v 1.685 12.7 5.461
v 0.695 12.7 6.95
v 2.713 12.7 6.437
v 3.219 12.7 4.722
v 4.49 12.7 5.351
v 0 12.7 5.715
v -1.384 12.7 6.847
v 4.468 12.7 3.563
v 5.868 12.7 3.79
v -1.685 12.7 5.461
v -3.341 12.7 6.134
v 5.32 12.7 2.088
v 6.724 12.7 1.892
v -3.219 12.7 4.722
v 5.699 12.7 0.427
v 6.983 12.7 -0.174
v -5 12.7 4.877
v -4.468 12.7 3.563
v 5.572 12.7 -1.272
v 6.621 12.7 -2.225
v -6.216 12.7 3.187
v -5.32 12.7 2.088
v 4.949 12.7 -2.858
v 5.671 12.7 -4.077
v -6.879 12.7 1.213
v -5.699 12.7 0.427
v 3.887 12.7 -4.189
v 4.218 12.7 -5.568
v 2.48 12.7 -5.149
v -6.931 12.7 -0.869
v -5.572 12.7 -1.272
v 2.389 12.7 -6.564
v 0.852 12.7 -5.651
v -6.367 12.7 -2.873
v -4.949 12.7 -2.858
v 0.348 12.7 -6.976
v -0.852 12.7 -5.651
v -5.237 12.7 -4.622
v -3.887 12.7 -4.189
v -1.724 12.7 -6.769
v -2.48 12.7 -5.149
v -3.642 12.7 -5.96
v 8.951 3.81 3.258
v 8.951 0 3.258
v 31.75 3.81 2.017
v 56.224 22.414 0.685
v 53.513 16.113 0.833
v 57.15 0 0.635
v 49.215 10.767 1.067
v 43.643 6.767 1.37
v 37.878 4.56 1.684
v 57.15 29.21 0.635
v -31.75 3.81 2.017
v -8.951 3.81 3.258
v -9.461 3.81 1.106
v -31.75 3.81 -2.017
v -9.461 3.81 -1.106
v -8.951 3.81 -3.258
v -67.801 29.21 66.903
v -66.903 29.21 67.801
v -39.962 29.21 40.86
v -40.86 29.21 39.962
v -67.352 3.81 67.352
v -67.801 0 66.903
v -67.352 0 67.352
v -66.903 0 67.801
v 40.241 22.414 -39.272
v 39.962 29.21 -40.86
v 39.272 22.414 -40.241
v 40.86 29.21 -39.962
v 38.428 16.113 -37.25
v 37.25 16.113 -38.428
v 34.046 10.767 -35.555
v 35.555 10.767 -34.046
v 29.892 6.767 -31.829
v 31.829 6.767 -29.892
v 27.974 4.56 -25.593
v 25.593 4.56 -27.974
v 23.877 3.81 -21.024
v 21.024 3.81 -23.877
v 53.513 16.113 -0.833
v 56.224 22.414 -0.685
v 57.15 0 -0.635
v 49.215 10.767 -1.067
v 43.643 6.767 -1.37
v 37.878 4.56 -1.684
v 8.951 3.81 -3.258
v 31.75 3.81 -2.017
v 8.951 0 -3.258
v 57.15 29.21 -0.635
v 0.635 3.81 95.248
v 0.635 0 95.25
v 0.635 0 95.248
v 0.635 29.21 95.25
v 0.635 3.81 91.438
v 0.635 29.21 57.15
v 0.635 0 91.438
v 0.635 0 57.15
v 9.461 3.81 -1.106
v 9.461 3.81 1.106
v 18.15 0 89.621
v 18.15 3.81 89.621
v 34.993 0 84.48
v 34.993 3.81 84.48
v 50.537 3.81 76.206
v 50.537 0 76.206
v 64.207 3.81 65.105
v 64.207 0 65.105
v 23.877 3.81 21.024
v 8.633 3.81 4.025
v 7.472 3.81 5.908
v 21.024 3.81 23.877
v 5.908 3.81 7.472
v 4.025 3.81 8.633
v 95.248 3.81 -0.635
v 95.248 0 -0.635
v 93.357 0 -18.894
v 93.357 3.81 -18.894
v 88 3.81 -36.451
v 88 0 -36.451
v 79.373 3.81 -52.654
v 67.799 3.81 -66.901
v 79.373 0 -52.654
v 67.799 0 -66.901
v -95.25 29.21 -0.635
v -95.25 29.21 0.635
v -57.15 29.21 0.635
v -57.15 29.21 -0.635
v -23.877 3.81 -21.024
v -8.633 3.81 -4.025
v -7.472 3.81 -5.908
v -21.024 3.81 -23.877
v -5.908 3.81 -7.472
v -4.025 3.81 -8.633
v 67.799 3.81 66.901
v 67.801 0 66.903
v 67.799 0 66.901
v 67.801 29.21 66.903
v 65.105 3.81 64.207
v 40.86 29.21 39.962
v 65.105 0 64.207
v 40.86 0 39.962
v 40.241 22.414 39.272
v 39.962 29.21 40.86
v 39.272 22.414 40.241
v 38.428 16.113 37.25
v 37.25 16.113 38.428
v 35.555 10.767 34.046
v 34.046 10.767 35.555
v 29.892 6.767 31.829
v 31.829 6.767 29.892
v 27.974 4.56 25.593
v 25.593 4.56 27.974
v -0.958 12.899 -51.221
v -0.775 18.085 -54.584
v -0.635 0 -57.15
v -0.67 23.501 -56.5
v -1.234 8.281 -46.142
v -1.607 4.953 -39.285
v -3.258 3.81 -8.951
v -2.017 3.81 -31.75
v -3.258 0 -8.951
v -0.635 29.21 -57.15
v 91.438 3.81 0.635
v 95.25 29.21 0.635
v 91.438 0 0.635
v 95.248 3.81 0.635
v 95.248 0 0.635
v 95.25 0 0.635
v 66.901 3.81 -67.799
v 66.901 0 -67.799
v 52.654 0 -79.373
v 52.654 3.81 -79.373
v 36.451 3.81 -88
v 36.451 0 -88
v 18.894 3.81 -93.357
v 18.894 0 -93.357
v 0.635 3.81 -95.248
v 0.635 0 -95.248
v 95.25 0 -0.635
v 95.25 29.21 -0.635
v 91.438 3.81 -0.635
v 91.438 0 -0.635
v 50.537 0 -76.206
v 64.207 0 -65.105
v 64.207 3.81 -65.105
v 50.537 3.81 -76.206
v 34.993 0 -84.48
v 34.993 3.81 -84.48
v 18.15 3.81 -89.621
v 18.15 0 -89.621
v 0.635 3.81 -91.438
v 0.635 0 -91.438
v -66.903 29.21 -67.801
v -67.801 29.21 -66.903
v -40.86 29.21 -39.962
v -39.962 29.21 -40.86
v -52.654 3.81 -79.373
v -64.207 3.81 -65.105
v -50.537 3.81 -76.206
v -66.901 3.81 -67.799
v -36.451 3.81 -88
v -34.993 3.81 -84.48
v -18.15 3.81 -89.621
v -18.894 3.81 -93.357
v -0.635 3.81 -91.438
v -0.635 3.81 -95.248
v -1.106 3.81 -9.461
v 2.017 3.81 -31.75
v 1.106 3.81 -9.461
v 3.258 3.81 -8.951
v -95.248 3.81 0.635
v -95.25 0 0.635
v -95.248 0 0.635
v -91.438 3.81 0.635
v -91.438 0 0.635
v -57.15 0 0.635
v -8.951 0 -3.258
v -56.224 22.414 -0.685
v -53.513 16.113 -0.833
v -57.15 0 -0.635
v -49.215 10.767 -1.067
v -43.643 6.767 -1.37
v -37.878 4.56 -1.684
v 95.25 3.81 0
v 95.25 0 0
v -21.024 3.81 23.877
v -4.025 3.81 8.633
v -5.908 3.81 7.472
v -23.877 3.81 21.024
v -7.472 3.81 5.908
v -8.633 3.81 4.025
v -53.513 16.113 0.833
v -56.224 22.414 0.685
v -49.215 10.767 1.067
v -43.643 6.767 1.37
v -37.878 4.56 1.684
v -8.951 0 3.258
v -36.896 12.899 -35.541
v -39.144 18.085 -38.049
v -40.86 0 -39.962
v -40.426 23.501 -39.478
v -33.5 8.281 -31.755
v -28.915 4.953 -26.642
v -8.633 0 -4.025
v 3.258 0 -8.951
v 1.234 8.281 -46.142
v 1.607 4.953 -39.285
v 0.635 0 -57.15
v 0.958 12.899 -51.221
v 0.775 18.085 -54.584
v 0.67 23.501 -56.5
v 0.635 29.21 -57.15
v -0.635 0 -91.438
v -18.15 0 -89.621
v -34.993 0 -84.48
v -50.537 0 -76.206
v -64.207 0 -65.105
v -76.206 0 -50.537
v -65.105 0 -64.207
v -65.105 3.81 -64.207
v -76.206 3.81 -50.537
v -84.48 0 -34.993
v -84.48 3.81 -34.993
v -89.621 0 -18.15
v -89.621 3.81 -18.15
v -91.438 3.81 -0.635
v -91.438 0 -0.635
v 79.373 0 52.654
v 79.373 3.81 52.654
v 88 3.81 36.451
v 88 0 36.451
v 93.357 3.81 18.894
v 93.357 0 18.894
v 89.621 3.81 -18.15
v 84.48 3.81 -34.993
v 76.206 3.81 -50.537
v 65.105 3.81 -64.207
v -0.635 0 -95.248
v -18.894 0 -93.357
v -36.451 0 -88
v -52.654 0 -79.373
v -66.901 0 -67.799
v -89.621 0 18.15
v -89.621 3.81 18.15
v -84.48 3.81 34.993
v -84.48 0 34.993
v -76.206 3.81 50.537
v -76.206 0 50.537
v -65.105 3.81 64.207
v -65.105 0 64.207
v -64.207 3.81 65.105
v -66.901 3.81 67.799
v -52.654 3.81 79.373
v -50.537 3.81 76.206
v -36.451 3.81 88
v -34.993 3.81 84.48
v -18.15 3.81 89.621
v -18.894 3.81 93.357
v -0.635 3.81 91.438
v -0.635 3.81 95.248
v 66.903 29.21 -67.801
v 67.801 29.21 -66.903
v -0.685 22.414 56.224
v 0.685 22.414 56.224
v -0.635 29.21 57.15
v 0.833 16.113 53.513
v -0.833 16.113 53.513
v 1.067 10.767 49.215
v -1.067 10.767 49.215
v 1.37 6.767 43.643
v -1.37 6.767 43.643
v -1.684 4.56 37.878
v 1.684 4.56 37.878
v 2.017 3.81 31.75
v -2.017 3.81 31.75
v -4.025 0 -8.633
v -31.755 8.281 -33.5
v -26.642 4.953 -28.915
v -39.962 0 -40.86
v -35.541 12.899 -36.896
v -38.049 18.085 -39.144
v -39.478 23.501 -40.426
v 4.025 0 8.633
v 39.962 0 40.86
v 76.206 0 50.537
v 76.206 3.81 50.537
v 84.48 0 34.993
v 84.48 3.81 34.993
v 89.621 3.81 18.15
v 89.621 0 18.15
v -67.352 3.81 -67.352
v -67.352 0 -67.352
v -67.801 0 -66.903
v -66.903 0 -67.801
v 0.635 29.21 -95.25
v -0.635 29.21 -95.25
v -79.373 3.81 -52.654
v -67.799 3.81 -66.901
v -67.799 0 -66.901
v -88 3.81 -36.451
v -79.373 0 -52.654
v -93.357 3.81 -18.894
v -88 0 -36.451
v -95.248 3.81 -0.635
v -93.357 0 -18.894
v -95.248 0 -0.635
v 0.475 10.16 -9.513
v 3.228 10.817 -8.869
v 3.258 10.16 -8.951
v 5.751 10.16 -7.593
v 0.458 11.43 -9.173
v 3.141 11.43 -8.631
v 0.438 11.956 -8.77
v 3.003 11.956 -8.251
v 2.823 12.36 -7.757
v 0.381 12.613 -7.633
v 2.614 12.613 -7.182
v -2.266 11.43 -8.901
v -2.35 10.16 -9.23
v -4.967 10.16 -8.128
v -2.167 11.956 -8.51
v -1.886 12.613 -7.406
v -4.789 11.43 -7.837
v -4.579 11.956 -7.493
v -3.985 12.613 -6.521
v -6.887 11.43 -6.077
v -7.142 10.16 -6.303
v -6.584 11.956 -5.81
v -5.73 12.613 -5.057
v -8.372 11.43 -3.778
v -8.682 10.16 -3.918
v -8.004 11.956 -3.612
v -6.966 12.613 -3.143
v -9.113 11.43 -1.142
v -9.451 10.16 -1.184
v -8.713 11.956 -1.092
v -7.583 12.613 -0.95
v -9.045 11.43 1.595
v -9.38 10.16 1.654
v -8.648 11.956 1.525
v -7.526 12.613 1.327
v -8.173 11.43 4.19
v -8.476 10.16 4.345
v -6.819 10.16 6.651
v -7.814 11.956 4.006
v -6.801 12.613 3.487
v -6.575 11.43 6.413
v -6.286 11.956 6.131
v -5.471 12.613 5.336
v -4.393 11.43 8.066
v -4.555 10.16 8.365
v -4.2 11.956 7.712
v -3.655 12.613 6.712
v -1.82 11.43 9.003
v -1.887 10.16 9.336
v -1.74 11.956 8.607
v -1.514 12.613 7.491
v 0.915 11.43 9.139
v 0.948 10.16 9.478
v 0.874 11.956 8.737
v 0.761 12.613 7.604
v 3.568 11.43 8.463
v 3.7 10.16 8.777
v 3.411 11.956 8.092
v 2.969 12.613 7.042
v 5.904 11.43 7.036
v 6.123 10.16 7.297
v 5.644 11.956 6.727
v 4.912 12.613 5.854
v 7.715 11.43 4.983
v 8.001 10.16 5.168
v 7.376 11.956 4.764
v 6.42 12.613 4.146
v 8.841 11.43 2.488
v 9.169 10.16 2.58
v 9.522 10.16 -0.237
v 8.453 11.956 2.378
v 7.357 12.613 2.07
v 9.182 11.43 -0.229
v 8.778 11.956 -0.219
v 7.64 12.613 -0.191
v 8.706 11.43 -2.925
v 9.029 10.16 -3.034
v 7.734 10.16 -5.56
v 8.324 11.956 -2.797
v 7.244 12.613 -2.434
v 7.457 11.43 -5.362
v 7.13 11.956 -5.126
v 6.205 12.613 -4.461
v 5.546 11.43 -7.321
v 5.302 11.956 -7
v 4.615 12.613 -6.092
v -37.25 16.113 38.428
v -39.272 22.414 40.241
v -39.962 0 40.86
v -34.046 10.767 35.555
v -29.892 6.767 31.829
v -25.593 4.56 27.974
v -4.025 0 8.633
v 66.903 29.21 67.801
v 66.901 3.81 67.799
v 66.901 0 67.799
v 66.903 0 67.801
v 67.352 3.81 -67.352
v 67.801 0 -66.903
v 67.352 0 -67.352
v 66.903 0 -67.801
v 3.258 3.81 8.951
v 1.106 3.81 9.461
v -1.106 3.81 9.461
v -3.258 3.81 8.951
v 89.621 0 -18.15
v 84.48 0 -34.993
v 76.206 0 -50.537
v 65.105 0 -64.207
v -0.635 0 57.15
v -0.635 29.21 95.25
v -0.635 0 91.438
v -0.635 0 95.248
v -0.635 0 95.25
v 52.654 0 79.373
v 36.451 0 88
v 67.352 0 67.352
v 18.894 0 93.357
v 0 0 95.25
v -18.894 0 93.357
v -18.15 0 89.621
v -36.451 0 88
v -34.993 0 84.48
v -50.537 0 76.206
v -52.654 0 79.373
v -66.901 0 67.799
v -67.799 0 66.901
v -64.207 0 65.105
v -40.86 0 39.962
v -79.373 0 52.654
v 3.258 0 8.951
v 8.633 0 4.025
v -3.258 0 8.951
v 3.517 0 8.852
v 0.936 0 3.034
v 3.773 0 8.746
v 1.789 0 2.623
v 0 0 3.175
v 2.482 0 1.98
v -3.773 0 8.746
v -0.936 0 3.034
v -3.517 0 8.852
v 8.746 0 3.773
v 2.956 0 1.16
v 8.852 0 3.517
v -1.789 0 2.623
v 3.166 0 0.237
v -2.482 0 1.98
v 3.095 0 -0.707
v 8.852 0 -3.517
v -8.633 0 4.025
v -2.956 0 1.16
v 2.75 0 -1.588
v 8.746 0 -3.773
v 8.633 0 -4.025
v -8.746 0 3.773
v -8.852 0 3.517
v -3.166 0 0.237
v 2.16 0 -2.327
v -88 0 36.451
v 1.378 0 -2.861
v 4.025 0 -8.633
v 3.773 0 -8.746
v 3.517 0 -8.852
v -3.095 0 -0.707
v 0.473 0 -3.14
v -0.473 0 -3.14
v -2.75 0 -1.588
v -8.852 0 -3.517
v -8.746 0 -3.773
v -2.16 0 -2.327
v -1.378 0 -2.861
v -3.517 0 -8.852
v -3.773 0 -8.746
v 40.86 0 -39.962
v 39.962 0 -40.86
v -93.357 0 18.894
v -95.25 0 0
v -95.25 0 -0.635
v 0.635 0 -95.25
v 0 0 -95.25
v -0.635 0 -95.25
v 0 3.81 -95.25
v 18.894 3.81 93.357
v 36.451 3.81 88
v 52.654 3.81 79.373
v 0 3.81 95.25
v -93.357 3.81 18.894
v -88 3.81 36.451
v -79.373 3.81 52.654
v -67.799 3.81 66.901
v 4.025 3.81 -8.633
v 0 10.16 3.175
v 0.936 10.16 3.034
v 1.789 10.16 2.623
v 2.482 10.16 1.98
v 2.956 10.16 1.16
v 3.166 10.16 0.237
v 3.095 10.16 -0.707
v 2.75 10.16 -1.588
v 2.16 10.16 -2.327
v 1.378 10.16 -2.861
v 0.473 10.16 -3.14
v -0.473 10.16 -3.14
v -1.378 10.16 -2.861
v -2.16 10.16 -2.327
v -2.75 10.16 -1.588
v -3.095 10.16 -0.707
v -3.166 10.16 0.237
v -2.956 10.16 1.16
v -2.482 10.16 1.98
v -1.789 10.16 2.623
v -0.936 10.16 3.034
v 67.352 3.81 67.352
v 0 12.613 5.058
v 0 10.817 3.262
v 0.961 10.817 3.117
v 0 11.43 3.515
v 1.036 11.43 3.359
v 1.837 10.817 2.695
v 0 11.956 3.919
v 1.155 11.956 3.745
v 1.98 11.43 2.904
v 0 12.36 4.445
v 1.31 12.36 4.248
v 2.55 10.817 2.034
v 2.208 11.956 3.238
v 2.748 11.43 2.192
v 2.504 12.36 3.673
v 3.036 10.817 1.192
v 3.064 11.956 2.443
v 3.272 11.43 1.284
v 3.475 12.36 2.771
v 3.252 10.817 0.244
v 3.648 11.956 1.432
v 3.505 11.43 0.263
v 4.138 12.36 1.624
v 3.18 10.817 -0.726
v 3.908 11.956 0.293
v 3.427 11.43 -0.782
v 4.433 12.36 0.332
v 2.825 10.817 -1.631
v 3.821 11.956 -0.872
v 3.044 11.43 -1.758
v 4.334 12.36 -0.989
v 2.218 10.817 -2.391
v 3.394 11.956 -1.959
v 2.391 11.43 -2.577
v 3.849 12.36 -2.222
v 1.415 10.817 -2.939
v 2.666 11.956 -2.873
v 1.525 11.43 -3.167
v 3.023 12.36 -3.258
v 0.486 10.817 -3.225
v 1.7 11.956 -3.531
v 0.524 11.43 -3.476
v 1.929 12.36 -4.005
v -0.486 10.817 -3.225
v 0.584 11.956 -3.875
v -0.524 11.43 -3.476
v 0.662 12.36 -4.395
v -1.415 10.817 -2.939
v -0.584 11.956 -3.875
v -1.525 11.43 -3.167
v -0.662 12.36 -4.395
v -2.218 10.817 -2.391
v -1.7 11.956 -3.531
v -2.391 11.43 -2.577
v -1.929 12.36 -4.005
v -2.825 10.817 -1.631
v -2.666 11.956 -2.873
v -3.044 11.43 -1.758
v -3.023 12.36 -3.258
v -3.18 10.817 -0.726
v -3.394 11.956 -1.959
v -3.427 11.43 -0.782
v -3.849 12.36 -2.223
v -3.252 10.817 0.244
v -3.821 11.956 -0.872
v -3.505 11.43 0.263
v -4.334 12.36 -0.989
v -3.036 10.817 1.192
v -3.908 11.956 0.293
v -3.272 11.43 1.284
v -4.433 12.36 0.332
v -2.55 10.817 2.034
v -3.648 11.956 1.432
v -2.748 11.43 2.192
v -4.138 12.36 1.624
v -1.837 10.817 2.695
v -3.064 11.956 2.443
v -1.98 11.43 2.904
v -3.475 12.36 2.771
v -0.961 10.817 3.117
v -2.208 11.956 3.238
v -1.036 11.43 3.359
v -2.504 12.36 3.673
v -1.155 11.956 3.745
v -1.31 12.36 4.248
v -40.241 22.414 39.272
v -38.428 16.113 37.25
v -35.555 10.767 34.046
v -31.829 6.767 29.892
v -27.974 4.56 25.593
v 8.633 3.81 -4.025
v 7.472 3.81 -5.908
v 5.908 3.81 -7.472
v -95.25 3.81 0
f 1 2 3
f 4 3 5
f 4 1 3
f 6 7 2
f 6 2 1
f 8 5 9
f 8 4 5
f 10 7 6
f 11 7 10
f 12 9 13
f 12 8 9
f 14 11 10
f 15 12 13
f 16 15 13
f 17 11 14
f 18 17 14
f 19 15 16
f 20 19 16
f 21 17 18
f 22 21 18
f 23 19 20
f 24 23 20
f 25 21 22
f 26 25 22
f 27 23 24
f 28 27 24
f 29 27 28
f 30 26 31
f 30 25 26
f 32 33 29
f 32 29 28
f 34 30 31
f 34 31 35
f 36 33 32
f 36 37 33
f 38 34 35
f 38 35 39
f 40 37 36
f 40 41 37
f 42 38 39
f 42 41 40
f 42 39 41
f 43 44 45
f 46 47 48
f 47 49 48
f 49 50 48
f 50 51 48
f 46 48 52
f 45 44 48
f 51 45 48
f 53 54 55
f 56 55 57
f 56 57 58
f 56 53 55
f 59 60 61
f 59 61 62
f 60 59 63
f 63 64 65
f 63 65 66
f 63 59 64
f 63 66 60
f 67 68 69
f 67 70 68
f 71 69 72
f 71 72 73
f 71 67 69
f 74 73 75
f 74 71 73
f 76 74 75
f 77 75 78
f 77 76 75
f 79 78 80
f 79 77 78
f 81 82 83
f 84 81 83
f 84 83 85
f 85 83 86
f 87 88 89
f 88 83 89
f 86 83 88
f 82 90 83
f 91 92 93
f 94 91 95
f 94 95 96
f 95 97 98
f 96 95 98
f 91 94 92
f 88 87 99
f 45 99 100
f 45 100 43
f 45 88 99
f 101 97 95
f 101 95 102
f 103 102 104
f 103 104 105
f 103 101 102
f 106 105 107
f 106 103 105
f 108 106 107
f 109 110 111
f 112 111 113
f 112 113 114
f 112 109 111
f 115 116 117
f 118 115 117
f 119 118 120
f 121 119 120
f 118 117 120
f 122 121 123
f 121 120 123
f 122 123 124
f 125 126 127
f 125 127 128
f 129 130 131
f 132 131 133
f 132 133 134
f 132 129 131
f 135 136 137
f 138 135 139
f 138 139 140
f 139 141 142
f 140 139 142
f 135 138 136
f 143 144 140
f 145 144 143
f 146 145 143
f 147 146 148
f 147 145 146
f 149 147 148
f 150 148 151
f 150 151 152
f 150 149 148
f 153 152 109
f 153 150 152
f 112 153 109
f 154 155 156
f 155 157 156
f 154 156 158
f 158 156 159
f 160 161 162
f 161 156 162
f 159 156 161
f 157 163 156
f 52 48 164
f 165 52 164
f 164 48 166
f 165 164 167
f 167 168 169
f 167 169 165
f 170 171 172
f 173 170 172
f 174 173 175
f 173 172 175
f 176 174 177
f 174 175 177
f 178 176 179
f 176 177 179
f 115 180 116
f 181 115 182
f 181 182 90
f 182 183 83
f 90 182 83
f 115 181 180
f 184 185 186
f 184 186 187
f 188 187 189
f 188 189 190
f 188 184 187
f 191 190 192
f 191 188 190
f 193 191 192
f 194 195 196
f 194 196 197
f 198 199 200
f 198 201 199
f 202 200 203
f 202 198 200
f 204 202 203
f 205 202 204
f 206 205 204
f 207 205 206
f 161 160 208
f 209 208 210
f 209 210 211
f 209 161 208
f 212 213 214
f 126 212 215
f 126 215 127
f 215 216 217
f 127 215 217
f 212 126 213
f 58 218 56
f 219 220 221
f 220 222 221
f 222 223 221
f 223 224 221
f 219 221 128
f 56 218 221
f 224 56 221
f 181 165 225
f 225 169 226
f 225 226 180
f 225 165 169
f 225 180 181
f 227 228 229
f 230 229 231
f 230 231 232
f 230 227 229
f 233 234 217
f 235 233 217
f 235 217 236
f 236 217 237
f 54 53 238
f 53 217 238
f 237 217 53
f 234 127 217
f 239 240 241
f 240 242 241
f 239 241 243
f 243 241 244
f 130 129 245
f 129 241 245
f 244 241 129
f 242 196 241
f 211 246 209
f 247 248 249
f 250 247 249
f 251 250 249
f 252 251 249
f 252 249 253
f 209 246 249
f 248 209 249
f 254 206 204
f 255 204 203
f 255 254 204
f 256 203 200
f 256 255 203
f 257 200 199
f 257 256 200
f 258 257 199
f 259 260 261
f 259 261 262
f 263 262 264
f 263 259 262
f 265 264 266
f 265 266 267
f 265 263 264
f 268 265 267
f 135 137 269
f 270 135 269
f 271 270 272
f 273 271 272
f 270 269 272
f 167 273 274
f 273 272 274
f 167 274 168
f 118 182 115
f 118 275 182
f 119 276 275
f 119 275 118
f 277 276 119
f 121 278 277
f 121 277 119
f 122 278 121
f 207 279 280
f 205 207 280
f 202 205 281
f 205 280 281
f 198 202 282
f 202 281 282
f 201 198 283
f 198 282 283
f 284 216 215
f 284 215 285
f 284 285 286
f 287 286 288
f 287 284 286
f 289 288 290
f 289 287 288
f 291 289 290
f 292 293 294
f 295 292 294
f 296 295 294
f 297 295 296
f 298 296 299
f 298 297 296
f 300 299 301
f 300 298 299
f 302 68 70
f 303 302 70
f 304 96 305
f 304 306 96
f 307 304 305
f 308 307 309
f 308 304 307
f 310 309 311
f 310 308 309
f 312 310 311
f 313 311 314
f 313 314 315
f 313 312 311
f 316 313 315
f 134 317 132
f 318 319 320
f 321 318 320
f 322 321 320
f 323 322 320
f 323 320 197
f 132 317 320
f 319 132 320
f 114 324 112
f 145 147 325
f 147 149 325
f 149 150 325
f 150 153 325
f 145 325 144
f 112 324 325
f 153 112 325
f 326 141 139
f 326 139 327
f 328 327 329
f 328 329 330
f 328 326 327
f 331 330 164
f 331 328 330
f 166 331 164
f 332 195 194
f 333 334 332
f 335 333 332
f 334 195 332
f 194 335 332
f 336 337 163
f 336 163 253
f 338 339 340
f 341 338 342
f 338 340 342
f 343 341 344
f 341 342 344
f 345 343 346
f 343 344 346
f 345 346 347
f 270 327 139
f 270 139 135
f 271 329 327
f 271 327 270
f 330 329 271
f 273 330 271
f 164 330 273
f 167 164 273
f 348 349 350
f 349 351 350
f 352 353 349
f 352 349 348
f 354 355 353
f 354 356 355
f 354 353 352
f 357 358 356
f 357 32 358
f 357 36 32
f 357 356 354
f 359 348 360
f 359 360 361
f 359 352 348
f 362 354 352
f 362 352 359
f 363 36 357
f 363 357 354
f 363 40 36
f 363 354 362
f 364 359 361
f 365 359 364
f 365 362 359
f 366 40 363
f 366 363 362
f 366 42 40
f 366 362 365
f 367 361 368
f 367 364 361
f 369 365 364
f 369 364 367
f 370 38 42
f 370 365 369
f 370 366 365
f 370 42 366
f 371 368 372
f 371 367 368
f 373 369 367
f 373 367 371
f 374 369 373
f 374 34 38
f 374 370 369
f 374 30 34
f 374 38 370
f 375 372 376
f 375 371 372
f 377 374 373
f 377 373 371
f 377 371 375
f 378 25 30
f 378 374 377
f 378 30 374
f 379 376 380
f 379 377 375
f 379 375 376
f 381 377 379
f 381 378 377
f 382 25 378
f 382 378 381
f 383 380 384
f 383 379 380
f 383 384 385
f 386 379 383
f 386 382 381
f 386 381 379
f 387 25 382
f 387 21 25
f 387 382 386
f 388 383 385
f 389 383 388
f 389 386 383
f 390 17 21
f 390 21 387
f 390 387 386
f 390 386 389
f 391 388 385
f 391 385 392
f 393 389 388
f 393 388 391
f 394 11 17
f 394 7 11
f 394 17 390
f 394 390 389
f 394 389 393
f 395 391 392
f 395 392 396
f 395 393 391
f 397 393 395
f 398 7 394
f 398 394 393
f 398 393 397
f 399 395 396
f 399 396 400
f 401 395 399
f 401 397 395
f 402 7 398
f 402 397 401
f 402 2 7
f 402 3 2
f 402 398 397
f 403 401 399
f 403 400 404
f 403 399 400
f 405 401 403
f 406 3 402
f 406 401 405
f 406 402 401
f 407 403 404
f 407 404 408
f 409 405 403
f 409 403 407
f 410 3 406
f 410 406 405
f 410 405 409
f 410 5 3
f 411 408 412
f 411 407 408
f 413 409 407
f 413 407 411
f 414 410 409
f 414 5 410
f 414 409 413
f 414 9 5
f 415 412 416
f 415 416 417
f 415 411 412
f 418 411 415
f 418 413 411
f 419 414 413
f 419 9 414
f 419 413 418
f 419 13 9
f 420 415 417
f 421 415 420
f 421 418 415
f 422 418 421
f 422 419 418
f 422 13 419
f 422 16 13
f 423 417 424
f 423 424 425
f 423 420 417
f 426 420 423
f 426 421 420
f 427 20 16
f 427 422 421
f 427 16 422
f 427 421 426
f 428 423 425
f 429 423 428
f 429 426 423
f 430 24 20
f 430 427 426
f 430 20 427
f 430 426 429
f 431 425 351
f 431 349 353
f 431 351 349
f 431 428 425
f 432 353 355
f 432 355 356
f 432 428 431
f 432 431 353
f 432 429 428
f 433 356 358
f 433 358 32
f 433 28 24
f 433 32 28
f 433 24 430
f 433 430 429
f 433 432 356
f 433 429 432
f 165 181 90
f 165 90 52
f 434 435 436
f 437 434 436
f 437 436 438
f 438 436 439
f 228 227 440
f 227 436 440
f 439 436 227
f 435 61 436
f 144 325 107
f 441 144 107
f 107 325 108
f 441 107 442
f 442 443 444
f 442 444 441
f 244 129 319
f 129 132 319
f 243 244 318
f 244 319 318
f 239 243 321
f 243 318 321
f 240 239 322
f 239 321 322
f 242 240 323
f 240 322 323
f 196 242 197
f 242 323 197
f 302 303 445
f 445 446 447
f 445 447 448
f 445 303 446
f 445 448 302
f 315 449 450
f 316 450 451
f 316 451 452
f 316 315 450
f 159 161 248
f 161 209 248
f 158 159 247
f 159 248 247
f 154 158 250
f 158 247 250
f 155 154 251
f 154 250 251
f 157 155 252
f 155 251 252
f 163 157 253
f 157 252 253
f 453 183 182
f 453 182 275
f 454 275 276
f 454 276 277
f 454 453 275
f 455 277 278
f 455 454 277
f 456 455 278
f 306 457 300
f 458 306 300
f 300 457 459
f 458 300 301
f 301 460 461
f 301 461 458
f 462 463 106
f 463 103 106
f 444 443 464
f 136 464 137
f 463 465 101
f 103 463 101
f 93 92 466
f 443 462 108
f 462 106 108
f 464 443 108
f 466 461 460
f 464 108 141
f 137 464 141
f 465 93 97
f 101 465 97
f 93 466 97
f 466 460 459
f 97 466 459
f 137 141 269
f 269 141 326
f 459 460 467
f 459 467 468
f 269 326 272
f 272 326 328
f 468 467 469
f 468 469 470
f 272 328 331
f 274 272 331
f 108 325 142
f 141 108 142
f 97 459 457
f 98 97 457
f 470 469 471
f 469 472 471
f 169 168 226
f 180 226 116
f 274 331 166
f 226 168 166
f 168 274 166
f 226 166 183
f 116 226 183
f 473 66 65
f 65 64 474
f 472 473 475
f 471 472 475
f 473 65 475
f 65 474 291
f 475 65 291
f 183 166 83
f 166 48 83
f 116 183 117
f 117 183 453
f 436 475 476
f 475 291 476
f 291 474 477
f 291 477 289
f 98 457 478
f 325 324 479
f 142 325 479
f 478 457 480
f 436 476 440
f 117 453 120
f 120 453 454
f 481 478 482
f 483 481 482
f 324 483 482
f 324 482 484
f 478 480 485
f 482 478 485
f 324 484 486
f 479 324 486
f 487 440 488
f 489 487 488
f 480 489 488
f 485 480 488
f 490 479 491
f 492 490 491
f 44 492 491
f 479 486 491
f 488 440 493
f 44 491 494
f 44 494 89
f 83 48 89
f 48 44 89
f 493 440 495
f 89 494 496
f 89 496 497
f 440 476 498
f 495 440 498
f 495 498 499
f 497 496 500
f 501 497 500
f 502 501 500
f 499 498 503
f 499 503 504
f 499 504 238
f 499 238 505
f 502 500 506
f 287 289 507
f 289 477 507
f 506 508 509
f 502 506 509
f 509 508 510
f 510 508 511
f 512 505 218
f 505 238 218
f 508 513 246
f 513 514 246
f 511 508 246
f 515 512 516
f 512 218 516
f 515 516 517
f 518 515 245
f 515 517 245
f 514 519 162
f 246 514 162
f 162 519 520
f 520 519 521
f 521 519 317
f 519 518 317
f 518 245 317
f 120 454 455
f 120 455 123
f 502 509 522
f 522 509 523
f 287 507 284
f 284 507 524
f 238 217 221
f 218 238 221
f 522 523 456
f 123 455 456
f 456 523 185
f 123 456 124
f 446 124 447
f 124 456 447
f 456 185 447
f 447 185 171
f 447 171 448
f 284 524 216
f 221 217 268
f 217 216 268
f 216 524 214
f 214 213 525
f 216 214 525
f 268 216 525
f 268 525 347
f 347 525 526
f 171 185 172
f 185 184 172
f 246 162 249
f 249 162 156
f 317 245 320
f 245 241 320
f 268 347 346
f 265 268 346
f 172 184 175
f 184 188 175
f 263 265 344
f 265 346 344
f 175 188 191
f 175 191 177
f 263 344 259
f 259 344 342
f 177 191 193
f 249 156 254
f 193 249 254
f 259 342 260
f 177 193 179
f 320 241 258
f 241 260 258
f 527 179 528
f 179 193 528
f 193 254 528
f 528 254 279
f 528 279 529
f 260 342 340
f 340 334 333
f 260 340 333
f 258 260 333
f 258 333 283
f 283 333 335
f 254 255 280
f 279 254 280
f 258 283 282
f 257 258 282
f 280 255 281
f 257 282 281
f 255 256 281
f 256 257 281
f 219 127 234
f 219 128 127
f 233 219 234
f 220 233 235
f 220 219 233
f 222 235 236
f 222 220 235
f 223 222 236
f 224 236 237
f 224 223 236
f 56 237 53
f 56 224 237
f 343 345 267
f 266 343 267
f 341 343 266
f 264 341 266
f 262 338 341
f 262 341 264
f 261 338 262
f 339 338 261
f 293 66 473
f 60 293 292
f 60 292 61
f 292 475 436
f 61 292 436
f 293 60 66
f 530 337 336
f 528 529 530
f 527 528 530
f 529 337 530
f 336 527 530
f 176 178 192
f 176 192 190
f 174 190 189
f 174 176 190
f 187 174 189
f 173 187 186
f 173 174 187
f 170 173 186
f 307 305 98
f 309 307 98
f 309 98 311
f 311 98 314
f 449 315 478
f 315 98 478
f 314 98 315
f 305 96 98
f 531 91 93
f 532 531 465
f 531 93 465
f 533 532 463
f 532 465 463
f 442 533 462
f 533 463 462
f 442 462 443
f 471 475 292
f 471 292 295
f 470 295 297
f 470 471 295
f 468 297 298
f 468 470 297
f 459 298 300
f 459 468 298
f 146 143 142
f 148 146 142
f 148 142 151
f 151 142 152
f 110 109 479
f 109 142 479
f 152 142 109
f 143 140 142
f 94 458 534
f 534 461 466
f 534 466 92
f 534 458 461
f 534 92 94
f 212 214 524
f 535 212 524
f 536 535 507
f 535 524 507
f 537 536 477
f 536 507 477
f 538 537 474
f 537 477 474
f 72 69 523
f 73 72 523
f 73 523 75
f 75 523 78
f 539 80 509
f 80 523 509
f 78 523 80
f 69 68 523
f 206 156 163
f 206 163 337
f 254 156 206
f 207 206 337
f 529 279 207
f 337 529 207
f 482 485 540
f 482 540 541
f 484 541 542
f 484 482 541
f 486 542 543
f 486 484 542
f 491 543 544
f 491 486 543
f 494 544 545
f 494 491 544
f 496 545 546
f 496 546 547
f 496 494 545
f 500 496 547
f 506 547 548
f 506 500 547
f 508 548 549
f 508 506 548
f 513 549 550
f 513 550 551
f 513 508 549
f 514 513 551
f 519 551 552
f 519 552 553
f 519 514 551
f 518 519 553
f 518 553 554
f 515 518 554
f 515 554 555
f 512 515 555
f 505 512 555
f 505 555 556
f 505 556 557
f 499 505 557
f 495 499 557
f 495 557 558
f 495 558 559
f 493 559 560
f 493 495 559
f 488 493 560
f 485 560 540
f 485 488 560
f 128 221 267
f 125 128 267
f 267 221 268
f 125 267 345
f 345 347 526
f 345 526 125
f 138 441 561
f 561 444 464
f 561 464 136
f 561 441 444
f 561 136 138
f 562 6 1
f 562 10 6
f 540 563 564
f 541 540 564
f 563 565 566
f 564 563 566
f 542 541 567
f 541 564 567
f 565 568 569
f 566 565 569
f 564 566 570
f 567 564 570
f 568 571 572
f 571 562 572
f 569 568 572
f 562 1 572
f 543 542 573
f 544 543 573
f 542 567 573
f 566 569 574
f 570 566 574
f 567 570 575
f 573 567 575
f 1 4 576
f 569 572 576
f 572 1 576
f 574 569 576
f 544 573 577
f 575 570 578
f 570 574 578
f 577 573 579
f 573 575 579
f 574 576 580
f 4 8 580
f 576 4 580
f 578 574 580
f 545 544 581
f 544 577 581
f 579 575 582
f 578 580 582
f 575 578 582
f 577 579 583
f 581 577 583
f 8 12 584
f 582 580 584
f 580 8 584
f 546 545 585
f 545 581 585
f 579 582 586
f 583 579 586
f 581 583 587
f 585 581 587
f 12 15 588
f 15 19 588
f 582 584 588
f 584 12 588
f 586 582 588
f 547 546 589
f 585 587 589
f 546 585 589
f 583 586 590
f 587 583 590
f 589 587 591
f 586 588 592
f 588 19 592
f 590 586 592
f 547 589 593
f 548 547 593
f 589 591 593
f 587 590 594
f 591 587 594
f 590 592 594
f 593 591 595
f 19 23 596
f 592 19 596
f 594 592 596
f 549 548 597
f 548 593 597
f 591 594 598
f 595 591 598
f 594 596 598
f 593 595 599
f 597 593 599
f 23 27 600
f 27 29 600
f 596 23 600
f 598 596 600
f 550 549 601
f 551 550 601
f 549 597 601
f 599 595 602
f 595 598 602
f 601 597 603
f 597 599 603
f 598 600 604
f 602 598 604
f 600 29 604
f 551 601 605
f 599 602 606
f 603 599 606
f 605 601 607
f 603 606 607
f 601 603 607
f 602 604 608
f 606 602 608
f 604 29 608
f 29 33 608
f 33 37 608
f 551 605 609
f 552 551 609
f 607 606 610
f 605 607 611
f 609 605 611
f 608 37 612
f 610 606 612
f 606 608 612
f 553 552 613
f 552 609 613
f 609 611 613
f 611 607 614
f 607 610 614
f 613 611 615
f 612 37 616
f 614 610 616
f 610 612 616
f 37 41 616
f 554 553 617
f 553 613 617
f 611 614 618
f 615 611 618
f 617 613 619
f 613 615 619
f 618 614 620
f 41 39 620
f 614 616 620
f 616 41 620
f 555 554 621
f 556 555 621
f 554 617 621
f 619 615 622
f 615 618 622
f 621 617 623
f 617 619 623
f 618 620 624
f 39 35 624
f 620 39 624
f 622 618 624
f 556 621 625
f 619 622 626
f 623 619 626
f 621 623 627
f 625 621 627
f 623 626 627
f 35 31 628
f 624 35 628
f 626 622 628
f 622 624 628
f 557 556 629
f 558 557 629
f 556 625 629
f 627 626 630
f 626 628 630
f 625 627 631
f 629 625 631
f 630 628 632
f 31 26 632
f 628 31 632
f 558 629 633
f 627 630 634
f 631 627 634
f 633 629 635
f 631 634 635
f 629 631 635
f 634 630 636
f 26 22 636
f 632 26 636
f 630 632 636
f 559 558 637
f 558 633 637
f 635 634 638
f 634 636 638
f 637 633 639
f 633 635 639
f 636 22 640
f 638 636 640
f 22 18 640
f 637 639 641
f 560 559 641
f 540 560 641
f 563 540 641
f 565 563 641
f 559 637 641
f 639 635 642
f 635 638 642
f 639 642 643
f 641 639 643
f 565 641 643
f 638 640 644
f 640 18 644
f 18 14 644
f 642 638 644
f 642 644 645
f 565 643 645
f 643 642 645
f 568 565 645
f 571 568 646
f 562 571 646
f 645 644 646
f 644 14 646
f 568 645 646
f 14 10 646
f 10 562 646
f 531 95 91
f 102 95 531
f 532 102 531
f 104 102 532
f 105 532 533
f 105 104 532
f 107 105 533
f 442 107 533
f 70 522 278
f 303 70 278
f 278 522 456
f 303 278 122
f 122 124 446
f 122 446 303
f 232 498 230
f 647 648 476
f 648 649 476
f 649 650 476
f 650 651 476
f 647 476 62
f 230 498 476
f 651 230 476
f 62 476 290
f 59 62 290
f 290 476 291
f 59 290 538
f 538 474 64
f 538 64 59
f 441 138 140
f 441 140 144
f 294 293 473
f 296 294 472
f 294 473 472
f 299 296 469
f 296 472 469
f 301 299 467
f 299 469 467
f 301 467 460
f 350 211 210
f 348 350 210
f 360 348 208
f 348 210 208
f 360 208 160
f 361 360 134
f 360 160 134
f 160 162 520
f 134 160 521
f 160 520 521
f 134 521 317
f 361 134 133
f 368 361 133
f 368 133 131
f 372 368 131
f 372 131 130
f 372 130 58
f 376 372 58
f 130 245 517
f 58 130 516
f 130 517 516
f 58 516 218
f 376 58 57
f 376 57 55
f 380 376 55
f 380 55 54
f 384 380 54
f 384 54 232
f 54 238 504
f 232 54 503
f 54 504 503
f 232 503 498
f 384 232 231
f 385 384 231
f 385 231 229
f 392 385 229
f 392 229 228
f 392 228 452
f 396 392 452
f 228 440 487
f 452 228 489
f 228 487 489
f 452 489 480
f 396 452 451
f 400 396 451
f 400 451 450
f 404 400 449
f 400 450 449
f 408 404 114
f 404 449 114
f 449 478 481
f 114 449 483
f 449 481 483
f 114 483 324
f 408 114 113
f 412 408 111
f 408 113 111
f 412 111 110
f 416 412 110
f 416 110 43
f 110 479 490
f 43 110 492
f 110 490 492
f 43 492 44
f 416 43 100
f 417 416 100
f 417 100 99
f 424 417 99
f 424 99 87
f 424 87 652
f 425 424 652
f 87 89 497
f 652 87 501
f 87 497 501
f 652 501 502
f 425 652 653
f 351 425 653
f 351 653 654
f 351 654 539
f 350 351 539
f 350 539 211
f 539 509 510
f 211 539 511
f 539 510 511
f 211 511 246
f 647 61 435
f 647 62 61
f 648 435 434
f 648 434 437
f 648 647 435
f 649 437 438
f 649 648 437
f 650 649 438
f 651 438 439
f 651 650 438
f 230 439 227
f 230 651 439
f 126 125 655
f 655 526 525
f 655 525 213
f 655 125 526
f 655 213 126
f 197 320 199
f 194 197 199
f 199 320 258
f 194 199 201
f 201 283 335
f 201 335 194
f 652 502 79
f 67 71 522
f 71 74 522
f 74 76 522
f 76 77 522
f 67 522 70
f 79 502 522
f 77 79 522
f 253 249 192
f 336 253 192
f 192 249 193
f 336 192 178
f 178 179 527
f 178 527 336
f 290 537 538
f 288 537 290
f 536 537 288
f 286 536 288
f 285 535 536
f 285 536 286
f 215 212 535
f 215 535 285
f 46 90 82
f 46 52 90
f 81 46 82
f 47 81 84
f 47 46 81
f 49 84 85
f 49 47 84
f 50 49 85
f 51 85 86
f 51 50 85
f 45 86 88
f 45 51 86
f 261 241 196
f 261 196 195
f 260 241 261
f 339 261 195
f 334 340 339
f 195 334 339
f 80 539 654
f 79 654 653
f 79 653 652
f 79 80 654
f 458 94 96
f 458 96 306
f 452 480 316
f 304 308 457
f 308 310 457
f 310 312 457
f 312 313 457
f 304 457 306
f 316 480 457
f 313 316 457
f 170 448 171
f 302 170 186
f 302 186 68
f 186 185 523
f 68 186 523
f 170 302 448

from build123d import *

# Parameters (mm, degrees)
BOSS_EXTRUDE1_DEPTH      = 3.81
SKETCH2_W                = 1.27
SKETCH2_H                = 38.1
BOSS_EXTRUDE2_DEPTH      = 25.4
FILLET1_R                = 25.4
SKETCH4_R                = 9.525
SKETCH4_R_2              = 3.175
BOSS_EXTRUDE3_DEPTH      = 12.7
CIRPATTERN5_COUNT        = 8
FILLET1_OF_CIRPATTERN5_R = 25.4
SKETCH5_R                = 95.25
SKETCH5_R_2              = 91.44
BOSS_EXTRUDE4_DEPTH      = 3.81
FILLET2_R                = 2.54


with BuildPart() as part:
    # Sketch1 → Boss-Extrude1 (new body)
    with BuildSketch(Plane(origin=(0, 0, 0), x_dir=(1, 0, 0), z_dir=(0, 1, 0))):
        with BuildLine():
            Line((-0.635, 57.15), (-3.257741865, 8.950572213))
            ThreePointArc((-3.257741865, 8.950572213), (0, 9.525), (3.257741865, 8.950572213))
            Line((3.257741865, 8.950572213), (0.635, 57.15))
            Line((0.635, 57.15), (0.635, 95.25))
            Line((0.635, 95.25), (-0.635, 95.25))
            Line((-0.635, 95.25), (-0.635, 57.15))
        make_face()
    boss_extrude1 = extrude(amount=BOSS_EXTRUDE1_DEPTH)

    # Sketch2 → Boss-Extrude2 (add)
    with BuildSketch(Plane(origin=(0, 3.81, 0), x_dir=(1, 0, 0), z_dir=(0, 1, 0))):
        with Locations((0, 76.2)):
            Rectangle(SKETCH2_W, SKETCH2_H)
    boss_extrude2 = extrude(amount=BOSS_EXTRUDE2_DEPTH)

    # Fillet1
    fillet1_edges = [part.edges().sort_by_distance(p)[0] for p in [
        (0, 3.81, -57.15),
    ]]
    fillet(fillet1_edges, radius=FILLET1_R - 0.0001)  # a hair under: the kernel refuses the full size

    # Sketch4 → Boss-Extrude3 (add)
    with BuildSketch(Plane(origin=(0, 0, 0), x_dir=(1, 0, 0), z_dir=(0, 1, 0))):
        with Locations(Location((0, 0, 0), (0, 0, 70))):
            Circle(SKETCH4_R)
        with Locations(Location((0, 0, 0), (0, 0, 270))):
            Circle(SKETCH4_R_2, mode=Mode.SUBTRACT)
    extrude(amount=BOSS_EXTRUDE3_DEPTH)

    # CirPattern5: Boss-Extrude1, Boss-Extrude2 ×8 about axis
    cirpattern5_axis = Axis((0, 0, 0), (0, 1, 0))
    add([boss_extrude1.rotate(cirpattern5_axis, i * 360 / CIRPATTERN5_COUNT) for i in range(1, CIRPATTERN5_COUNT)])
    add([boss_extrude2.rotate(cirpattern5_axis, i * 360 / CIRPATTERN5_COUNT) for i in range(1, CIRPATTERN5_COUNT)])

    # Fillet1 of CirPattern5
    fillet1_of_cirpattern5_edges = [part.edges().sort_by_distance(p)[0] for p in [
        (-40.411152545, 3.81, -40.411152545),
        (-57.15, 3.81, 0),
        (-40.411152545, 3.81, 40.411152545),
        (0, 3.81, 57.15),
        (40.411152545, 3.81, 40.411152545),
        (57.15, 3.81, 0),
        (40.411152545, 3.81, -40.411152545),
    ]]
    fillet(fillet1_of_cirpattern5_edges, radius=FILLET1_OF_CIRPATTERN5_R - 0.0001)  # a hair under: the kernel refuses the full size

    # Sketch5 → Boss-Extrude4 (add)
    with BuildSketch(Plane(origin=(0, 0, 0), x_dir=(1, 0, 0), z_dir=(0, 1, 0))):
        Circle(SKETCH5_R)
        Circle(SKETCH5_R_2, mode=Mode.SUBTRACT)
    extrude(amount=BOSS_EXTRUDE4_DEPTH)

    # Fillet2
    fillet2_edges = [part.edges().sort_by_distance(p)[0] for p in [
        (-3.257741865, 12.7, 8.950572213),
        (0, 12.7, -3.175),
    ]]
    fillet(fillet2_edges, radius=FILLET2_R)


solid = part.part
